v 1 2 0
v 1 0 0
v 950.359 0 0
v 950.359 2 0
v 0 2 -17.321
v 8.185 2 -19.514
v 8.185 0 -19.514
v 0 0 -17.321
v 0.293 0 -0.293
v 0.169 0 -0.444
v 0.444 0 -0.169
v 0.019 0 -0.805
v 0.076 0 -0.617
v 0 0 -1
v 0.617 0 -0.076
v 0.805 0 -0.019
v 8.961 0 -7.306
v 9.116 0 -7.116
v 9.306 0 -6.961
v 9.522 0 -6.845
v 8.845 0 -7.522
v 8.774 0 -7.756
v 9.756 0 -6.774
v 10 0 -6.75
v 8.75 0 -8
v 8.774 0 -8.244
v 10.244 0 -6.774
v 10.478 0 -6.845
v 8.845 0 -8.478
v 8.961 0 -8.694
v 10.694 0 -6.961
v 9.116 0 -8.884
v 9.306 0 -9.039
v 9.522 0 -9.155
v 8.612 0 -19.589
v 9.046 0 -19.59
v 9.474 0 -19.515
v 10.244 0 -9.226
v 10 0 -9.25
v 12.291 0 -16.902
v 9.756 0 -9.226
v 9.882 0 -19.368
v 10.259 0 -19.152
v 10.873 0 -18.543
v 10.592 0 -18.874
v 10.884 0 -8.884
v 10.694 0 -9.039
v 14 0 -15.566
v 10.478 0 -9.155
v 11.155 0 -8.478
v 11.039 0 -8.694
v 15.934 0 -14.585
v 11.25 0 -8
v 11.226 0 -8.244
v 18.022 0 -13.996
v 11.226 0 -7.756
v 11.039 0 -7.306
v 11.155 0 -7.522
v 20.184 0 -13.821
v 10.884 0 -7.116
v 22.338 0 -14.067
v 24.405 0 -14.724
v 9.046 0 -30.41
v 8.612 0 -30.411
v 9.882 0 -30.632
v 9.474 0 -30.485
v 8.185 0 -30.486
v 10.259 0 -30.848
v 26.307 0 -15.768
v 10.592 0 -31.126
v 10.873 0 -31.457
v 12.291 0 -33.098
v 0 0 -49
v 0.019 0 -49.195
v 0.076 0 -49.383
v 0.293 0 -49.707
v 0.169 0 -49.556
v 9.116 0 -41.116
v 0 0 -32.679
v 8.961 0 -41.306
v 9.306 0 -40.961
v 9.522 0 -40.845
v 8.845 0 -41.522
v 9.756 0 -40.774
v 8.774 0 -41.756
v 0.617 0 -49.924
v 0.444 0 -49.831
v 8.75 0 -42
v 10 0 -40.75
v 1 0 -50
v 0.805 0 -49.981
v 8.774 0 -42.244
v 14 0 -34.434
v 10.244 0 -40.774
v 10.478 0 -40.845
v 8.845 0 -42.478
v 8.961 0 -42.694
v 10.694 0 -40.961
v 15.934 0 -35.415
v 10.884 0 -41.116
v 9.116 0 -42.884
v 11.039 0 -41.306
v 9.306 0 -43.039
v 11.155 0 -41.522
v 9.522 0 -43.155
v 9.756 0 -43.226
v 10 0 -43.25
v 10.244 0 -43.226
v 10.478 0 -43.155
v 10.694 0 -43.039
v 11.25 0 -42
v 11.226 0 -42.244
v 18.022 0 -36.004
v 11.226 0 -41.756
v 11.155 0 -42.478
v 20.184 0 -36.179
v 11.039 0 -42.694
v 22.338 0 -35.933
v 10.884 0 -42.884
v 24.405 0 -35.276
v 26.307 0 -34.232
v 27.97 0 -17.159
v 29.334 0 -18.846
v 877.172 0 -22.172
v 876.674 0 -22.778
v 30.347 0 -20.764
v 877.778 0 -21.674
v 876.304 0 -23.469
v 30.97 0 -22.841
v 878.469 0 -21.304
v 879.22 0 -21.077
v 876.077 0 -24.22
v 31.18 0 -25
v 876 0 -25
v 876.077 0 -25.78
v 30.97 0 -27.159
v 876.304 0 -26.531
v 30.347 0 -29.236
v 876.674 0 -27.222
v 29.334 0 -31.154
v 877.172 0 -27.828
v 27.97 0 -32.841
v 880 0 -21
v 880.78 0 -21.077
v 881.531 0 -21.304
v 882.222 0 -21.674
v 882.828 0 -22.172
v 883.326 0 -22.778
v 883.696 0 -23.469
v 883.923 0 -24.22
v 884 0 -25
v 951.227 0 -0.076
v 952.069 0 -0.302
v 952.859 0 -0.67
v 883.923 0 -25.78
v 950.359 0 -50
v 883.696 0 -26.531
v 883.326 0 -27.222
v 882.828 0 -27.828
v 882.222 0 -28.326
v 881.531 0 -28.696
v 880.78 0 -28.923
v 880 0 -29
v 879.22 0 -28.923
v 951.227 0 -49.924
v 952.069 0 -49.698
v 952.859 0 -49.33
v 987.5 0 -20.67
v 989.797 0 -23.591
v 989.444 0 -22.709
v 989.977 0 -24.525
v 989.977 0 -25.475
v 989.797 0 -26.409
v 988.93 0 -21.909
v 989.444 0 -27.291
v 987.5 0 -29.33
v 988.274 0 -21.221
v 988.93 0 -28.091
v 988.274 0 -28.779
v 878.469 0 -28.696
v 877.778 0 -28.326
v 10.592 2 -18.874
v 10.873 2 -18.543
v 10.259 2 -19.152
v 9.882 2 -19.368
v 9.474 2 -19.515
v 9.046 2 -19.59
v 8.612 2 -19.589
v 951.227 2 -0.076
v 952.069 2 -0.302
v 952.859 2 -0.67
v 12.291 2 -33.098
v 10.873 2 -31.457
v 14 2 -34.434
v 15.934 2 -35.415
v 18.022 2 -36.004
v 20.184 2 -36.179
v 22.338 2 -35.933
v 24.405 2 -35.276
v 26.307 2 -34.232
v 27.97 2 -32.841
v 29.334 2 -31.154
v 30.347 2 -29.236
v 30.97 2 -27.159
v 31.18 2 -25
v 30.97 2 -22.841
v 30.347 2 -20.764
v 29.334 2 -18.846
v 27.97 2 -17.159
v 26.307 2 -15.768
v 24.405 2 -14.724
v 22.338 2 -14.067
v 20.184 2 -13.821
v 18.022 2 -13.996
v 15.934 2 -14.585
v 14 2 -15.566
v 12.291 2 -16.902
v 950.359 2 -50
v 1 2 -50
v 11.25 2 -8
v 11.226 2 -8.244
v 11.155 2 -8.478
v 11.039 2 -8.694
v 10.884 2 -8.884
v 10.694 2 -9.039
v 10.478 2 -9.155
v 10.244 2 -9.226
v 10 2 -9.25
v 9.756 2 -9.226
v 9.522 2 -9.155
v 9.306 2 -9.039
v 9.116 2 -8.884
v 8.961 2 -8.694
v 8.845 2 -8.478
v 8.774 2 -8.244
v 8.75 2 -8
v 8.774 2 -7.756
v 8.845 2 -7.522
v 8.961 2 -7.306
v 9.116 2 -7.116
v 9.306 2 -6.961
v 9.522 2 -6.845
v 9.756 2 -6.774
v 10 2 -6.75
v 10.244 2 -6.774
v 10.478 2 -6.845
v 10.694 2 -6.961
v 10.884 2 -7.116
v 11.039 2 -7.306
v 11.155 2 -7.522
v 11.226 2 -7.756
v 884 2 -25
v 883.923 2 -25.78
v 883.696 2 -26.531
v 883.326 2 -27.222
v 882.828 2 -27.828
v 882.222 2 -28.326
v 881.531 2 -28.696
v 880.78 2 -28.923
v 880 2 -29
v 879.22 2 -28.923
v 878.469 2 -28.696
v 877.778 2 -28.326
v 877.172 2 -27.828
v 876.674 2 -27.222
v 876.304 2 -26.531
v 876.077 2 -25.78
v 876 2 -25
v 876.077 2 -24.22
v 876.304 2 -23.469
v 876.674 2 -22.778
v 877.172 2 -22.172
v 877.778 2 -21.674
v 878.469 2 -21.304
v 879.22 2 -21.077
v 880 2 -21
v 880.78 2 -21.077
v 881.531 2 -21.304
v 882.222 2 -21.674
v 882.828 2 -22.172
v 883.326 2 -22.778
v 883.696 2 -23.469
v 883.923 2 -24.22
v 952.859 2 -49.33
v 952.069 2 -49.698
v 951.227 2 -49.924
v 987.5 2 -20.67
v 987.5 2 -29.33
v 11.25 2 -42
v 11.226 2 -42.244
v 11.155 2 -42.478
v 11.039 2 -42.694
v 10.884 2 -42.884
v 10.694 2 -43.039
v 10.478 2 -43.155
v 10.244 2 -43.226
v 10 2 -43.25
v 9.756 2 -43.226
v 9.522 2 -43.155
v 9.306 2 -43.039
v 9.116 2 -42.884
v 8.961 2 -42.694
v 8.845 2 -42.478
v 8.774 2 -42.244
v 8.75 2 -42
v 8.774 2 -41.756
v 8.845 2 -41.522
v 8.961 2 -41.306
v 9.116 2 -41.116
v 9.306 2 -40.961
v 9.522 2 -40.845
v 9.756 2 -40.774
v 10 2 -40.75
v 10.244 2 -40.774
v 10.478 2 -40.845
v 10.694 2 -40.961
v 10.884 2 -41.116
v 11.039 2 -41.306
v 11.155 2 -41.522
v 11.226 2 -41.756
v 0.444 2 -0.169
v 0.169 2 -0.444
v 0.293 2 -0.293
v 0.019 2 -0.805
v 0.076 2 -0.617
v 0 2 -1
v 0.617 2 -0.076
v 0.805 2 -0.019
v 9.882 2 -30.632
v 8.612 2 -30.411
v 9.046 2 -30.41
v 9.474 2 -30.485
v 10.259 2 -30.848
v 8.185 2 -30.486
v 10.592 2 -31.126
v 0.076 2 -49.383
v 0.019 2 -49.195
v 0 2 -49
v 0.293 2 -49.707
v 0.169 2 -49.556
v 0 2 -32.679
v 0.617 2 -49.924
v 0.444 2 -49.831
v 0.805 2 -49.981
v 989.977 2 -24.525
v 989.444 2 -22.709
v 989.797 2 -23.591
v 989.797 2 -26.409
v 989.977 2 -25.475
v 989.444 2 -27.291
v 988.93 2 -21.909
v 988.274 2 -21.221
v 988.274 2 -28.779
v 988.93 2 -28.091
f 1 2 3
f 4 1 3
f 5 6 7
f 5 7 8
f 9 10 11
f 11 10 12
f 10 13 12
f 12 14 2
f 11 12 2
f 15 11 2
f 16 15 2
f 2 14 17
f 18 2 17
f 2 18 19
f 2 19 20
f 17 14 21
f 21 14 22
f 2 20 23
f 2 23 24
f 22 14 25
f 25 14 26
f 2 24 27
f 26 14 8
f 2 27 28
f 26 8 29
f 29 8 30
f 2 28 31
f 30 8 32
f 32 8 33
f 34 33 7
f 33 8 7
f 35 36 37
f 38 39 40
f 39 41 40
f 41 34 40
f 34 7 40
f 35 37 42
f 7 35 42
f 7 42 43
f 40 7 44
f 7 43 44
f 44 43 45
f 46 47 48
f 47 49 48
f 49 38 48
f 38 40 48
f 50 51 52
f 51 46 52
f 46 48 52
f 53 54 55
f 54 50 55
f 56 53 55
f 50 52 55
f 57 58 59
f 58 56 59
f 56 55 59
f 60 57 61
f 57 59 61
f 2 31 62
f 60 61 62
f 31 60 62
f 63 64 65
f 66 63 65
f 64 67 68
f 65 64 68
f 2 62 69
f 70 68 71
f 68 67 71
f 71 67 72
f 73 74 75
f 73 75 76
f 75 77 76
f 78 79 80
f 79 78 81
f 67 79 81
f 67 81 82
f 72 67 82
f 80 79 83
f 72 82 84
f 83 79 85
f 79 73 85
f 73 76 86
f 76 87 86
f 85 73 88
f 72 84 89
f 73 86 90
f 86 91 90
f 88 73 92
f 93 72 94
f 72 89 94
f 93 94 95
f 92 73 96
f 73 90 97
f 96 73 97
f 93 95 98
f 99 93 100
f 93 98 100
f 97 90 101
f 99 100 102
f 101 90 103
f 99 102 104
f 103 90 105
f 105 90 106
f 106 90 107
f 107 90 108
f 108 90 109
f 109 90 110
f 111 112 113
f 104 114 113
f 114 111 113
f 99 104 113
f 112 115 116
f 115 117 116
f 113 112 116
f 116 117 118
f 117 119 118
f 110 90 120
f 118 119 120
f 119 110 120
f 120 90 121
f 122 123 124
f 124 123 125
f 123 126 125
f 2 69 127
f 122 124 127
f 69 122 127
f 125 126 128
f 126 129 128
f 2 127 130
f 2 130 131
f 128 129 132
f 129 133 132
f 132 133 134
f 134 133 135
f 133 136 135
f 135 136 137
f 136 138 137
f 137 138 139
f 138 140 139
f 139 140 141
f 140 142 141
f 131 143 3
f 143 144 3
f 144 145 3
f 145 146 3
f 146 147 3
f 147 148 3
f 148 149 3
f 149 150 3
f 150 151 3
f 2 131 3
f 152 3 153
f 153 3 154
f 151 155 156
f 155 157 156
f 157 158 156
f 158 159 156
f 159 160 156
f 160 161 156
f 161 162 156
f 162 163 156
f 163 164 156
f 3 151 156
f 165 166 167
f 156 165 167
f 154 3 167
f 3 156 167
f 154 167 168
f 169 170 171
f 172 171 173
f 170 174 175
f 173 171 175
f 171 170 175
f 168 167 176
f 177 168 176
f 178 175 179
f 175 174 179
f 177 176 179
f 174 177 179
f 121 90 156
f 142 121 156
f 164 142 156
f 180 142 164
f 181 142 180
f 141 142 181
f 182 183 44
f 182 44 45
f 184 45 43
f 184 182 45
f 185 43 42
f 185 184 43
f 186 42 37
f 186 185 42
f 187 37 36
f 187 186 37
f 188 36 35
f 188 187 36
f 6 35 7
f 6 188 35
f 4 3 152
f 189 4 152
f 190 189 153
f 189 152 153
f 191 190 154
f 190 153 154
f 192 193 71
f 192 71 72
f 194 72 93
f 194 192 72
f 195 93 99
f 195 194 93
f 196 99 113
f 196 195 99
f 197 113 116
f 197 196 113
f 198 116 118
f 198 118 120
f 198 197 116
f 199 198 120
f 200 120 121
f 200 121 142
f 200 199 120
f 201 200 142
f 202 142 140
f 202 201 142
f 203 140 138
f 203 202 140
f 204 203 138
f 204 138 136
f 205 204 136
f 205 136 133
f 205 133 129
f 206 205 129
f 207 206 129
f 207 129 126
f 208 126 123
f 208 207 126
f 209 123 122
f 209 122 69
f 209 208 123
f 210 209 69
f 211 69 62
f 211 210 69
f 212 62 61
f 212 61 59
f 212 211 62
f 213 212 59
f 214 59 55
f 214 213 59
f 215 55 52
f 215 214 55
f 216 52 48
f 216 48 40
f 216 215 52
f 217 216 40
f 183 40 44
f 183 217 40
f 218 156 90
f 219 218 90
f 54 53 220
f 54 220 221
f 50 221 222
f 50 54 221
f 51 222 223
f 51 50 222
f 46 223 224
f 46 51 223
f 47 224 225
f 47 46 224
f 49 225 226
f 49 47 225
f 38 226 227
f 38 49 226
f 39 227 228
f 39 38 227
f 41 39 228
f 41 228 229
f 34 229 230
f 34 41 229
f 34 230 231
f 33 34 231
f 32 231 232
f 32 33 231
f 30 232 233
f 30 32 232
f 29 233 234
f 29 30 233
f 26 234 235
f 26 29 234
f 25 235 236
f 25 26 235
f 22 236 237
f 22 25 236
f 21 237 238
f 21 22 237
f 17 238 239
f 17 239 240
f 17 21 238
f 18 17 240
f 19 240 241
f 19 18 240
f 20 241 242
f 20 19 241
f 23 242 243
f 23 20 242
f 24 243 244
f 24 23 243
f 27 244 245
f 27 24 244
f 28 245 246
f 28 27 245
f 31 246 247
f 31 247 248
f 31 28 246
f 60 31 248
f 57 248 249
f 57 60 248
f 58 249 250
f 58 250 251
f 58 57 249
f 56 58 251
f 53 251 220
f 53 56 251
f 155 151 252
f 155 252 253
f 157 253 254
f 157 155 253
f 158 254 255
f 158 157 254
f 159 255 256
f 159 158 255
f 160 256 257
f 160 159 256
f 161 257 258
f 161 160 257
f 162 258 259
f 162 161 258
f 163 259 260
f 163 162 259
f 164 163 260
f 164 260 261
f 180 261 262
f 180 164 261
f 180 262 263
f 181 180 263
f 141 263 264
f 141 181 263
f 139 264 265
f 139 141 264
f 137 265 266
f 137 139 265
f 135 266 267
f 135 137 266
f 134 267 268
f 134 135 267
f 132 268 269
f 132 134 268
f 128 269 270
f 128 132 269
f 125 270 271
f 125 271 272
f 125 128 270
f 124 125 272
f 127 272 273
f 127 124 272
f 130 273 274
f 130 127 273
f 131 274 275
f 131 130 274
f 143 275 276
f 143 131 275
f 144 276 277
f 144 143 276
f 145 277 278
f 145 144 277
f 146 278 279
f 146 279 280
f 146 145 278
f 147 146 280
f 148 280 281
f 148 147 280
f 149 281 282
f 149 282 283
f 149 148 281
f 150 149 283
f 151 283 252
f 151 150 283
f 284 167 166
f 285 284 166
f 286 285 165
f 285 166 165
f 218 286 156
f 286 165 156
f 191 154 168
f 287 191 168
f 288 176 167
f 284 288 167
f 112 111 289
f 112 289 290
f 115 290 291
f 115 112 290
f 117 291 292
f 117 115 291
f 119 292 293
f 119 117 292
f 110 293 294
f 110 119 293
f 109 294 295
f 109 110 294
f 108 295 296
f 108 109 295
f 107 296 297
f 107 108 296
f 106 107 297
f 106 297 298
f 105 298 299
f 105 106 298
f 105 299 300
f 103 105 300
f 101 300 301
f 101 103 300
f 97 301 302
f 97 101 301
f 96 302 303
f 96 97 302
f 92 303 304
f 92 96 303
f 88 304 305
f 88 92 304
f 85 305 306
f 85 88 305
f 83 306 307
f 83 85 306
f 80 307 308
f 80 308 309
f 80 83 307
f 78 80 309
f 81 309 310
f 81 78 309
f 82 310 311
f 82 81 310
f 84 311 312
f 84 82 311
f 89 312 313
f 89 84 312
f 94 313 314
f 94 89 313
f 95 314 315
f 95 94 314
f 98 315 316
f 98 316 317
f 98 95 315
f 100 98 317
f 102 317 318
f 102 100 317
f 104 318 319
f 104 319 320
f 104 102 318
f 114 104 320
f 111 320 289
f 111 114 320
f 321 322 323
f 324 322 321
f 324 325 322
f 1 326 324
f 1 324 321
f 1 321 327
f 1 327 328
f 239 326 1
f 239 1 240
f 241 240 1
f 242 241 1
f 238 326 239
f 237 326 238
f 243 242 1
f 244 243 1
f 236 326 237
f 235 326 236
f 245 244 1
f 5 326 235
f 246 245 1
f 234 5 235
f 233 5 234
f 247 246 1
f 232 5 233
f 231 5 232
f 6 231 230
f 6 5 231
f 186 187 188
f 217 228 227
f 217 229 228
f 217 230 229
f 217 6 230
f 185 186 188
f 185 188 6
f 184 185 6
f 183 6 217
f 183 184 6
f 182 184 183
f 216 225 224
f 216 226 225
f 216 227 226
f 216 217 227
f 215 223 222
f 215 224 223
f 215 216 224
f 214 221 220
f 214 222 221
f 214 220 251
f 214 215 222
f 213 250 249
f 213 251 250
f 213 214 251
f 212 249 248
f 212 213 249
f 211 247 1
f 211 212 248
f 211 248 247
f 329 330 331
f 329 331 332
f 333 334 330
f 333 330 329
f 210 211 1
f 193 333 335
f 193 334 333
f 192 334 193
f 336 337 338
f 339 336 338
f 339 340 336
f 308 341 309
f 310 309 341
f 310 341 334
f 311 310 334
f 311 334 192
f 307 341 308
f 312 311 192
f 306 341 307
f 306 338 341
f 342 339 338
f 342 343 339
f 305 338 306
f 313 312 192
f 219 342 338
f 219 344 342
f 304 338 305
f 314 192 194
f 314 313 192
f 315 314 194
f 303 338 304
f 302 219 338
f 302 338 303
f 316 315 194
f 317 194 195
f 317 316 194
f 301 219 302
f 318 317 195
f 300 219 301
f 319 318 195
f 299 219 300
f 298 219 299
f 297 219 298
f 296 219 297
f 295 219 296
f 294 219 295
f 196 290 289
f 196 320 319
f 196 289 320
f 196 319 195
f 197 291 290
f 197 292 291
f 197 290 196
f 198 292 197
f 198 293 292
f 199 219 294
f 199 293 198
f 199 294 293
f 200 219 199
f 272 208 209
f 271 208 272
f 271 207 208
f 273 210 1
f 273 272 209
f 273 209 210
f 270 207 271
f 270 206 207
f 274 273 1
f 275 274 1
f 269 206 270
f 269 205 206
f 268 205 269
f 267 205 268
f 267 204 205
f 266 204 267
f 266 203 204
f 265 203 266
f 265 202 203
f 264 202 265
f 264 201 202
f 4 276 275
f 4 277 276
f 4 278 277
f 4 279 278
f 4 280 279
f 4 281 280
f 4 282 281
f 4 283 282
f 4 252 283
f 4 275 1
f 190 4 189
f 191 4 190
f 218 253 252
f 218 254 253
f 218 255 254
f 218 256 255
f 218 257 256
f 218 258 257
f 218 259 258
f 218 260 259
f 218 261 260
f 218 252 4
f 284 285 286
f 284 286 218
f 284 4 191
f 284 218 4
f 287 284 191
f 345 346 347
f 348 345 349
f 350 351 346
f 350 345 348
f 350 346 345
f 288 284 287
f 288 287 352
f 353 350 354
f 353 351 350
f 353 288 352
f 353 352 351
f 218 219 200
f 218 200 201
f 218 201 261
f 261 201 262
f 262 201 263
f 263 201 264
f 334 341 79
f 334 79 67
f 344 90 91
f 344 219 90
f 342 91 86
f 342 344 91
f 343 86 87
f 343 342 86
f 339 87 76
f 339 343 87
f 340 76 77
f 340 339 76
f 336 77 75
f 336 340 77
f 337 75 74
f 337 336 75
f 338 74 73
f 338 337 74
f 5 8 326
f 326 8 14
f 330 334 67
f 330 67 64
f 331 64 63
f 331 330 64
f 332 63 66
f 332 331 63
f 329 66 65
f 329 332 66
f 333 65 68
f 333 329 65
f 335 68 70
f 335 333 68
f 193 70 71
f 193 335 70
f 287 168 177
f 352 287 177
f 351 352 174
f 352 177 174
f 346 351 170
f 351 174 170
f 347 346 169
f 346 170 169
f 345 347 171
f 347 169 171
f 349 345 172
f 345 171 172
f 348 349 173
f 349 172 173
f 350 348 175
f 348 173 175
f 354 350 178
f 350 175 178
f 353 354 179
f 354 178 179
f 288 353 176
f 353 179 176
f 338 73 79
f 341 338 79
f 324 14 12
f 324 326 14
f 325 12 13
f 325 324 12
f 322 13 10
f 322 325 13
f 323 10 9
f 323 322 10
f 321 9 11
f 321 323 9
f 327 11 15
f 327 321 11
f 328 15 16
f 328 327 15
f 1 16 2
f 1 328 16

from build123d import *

# Parameters (mm, degrees)
SKETCH1_R           = 4
SKETCH1_R_2         = 1.25
BOSS_EXTRUDE1_DEPTH = 2
FILLET1_R           = 1
CUT_EXTRUDE1_DEPTH  = 2


with BuildPart() as part:
    # Sketch1 → Boss-Extrude1 (new body)
    with BuildSketch(Plane(origin=(0, 0, 0), x_dir=(1, 0, 0), z_dir=(0, 1, 0))):
        with BuildLine():
            Line((987.5, 29.330127019), (952.858983849, 49.330127019))
            ThreePointArc((952.858983849, 49.330127019), (951.653079074, 49.829629131), (950.358983849, 50))
            Line((950.358983849, 50), (0, 50))
            Line((0, 50), (0, 0))
            Line((0, 0), (950.358983849, 0))
            ThreePointArc((950.358983849, 0), (951.653079074, 0.170370869), (952.858983849, 0.669872981))
            Line((952.858983849, 0.669872981), (987.5, 20.669872981))
            ThreePointArc((987.5, 20.669872981), (990, 25), (987.5, 29.330127019))
        make_face()
        with Locations((880, 25)):
            Circle(SKETCH1_R, mode=Mode.SUBTRACT)
        with Locations((10, 42)):
            Circle(SKETCH1_R_2, mode=Mode.SUBTRACT)
        with Locations((10, 8)):
            Circle(SKETCH1_R_2, mode=Mode.SUBTRACT)
    extrude(amount=BOSS_EXTRUDE1_DEPTH)

    # Fillet1
    fillet1_edges = [part.edges().sort_by_distance(p)[0] for p in [
        (0, 1, -50),
        (0, 1, 0),
    ]]
    fillet(fillet1_edges, radius=FILLET1_R)

    # Sketch2 → Cut-Extrude1 (cut)
    with BuildSketch(Plane(origin=(0, 2, 0), x_dir=(1, 0, 0), z_dir=(0, 1, 0))):
        with BuildLine():
            Line((8.184981615, 19.51366729), (0, 17.320508076))
            Line((0, 17.320508076), (0, 32.679491924))
            Line((0, 32.679491924), (8.184981615, 30.48633271))
            ThreePointArc((8.184981615, 30.48633271), (9.68136243, 30.549842721), (10.872908853, 31.457260037))
            ThreePointArc((10.872908853, 31.457260037), (31.180339887, 25), (10.872908853, 18.542739963))
            ThreePointArc((10.872908853, 18.542739963), (9.68136243, 19.450157279), (8.184981615, 19.51366729))
        make_face()
    extrude(amount=-CUT_EXTRUDE1_DEPTH, mode=Mode.SUBTRACT)


solid = part.part
